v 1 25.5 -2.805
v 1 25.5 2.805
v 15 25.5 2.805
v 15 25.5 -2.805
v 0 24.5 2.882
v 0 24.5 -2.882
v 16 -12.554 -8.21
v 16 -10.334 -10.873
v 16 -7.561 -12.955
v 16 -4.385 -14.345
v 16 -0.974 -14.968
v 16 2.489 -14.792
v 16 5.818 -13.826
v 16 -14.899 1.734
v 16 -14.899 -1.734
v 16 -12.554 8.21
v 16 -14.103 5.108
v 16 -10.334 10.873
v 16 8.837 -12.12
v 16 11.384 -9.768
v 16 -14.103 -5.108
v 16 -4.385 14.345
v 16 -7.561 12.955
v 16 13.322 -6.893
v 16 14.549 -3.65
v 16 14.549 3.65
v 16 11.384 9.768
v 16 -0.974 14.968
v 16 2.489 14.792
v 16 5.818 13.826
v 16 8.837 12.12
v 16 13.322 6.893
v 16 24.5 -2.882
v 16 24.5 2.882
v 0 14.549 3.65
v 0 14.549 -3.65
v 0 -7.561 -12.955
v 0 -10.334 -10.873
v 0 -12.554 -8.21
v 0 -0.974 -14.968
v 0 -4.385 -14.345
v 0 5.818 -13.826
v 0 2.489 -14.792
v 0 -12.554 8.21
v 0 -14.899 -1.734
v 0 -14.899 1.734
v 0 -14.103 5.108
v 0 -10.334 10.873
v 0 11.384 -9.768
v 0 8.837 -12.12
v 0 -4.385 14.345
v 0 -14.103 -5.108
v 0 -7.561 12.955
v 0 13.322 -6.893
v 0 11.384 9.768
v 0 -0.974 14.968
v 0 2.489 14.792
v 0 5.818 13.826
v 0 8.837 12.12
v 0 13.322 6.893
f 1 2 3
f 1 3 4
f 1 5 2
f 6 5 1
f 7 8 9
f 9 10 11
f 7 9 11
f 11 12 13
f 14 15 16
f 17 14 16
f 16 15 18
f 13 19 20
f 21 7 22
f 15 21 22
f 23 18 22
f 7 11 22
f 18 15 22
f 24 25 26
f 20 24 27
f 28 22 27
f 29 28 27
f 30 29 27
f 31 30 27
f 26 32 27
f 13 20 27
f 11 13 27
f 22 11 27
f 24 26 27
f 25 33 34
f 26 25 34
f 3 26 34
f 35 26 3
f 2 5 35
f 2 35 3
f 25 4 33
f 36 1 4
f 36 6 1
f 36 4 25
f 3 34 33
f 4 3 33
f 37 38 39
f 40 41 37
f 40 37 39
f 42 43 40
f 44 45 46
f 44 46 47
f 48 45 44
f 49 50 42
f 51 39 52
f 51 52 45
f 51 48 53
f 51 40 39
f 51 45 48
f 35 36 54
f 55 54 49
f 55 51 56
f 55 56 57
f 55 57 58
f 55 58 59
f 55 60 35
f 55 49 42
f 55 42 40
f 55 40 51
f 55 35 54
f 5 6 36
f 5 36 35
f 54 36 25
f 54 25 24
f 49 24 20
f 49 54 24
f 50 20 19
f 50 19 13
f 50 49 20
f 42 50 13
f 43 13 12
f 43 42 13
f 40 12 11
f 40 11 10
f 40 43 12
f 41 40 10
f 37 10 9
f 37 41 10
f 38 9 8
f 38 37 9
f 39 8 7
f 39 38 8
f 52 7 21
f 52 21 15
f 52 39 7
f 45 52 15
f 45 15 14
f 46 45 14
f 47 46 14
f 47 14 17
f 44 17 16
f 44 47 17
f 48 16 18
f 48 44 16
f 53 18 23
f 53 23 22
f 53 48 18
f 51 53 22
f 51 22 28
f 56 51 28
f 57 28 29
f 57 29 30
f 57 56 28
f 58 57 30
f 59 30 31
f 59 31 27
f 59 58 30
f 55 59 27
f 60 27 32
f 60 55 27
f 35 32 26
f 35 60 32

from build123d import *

# Parameters (mm, degrees)
BOSS_EXTRUDE1_DEPTH = 16
CHAMFER1_SIZE       = 1


with BuildPart() as part:
    # Sketch1 → Boss-Extrude1 (new body)
    with BuildSketch(Plane(origin=(0, 0, 0), x_dir=(0, 0, -1), z_dir=(1, 0, 0))):
        with BuildLine():
            Line((-3.65, 14.549140868), (-2.805, 25.5))
            Line((-2.805, 25.5), (2.805, 25.5))
            Line((2.805, 25.5), (3.65, 14.549140868))
            ThreePointArc((3.65, 14.549140868), (0, -15), (-3.65, 14.549140868))
        make_face()
    extrude(amount=BOSS_EXTRUDE1_DEPTH)

    # Chamfer1
    chamfer1_edges = [part.edges().sort_by_distance(p)[0] for p in [
        (0, 25.5, 0),
        (16, 25.5, 0),
    ]]
    chamfer(chamfer1_edges, length=CHAMFER1_SIZE)


solid = part.part
